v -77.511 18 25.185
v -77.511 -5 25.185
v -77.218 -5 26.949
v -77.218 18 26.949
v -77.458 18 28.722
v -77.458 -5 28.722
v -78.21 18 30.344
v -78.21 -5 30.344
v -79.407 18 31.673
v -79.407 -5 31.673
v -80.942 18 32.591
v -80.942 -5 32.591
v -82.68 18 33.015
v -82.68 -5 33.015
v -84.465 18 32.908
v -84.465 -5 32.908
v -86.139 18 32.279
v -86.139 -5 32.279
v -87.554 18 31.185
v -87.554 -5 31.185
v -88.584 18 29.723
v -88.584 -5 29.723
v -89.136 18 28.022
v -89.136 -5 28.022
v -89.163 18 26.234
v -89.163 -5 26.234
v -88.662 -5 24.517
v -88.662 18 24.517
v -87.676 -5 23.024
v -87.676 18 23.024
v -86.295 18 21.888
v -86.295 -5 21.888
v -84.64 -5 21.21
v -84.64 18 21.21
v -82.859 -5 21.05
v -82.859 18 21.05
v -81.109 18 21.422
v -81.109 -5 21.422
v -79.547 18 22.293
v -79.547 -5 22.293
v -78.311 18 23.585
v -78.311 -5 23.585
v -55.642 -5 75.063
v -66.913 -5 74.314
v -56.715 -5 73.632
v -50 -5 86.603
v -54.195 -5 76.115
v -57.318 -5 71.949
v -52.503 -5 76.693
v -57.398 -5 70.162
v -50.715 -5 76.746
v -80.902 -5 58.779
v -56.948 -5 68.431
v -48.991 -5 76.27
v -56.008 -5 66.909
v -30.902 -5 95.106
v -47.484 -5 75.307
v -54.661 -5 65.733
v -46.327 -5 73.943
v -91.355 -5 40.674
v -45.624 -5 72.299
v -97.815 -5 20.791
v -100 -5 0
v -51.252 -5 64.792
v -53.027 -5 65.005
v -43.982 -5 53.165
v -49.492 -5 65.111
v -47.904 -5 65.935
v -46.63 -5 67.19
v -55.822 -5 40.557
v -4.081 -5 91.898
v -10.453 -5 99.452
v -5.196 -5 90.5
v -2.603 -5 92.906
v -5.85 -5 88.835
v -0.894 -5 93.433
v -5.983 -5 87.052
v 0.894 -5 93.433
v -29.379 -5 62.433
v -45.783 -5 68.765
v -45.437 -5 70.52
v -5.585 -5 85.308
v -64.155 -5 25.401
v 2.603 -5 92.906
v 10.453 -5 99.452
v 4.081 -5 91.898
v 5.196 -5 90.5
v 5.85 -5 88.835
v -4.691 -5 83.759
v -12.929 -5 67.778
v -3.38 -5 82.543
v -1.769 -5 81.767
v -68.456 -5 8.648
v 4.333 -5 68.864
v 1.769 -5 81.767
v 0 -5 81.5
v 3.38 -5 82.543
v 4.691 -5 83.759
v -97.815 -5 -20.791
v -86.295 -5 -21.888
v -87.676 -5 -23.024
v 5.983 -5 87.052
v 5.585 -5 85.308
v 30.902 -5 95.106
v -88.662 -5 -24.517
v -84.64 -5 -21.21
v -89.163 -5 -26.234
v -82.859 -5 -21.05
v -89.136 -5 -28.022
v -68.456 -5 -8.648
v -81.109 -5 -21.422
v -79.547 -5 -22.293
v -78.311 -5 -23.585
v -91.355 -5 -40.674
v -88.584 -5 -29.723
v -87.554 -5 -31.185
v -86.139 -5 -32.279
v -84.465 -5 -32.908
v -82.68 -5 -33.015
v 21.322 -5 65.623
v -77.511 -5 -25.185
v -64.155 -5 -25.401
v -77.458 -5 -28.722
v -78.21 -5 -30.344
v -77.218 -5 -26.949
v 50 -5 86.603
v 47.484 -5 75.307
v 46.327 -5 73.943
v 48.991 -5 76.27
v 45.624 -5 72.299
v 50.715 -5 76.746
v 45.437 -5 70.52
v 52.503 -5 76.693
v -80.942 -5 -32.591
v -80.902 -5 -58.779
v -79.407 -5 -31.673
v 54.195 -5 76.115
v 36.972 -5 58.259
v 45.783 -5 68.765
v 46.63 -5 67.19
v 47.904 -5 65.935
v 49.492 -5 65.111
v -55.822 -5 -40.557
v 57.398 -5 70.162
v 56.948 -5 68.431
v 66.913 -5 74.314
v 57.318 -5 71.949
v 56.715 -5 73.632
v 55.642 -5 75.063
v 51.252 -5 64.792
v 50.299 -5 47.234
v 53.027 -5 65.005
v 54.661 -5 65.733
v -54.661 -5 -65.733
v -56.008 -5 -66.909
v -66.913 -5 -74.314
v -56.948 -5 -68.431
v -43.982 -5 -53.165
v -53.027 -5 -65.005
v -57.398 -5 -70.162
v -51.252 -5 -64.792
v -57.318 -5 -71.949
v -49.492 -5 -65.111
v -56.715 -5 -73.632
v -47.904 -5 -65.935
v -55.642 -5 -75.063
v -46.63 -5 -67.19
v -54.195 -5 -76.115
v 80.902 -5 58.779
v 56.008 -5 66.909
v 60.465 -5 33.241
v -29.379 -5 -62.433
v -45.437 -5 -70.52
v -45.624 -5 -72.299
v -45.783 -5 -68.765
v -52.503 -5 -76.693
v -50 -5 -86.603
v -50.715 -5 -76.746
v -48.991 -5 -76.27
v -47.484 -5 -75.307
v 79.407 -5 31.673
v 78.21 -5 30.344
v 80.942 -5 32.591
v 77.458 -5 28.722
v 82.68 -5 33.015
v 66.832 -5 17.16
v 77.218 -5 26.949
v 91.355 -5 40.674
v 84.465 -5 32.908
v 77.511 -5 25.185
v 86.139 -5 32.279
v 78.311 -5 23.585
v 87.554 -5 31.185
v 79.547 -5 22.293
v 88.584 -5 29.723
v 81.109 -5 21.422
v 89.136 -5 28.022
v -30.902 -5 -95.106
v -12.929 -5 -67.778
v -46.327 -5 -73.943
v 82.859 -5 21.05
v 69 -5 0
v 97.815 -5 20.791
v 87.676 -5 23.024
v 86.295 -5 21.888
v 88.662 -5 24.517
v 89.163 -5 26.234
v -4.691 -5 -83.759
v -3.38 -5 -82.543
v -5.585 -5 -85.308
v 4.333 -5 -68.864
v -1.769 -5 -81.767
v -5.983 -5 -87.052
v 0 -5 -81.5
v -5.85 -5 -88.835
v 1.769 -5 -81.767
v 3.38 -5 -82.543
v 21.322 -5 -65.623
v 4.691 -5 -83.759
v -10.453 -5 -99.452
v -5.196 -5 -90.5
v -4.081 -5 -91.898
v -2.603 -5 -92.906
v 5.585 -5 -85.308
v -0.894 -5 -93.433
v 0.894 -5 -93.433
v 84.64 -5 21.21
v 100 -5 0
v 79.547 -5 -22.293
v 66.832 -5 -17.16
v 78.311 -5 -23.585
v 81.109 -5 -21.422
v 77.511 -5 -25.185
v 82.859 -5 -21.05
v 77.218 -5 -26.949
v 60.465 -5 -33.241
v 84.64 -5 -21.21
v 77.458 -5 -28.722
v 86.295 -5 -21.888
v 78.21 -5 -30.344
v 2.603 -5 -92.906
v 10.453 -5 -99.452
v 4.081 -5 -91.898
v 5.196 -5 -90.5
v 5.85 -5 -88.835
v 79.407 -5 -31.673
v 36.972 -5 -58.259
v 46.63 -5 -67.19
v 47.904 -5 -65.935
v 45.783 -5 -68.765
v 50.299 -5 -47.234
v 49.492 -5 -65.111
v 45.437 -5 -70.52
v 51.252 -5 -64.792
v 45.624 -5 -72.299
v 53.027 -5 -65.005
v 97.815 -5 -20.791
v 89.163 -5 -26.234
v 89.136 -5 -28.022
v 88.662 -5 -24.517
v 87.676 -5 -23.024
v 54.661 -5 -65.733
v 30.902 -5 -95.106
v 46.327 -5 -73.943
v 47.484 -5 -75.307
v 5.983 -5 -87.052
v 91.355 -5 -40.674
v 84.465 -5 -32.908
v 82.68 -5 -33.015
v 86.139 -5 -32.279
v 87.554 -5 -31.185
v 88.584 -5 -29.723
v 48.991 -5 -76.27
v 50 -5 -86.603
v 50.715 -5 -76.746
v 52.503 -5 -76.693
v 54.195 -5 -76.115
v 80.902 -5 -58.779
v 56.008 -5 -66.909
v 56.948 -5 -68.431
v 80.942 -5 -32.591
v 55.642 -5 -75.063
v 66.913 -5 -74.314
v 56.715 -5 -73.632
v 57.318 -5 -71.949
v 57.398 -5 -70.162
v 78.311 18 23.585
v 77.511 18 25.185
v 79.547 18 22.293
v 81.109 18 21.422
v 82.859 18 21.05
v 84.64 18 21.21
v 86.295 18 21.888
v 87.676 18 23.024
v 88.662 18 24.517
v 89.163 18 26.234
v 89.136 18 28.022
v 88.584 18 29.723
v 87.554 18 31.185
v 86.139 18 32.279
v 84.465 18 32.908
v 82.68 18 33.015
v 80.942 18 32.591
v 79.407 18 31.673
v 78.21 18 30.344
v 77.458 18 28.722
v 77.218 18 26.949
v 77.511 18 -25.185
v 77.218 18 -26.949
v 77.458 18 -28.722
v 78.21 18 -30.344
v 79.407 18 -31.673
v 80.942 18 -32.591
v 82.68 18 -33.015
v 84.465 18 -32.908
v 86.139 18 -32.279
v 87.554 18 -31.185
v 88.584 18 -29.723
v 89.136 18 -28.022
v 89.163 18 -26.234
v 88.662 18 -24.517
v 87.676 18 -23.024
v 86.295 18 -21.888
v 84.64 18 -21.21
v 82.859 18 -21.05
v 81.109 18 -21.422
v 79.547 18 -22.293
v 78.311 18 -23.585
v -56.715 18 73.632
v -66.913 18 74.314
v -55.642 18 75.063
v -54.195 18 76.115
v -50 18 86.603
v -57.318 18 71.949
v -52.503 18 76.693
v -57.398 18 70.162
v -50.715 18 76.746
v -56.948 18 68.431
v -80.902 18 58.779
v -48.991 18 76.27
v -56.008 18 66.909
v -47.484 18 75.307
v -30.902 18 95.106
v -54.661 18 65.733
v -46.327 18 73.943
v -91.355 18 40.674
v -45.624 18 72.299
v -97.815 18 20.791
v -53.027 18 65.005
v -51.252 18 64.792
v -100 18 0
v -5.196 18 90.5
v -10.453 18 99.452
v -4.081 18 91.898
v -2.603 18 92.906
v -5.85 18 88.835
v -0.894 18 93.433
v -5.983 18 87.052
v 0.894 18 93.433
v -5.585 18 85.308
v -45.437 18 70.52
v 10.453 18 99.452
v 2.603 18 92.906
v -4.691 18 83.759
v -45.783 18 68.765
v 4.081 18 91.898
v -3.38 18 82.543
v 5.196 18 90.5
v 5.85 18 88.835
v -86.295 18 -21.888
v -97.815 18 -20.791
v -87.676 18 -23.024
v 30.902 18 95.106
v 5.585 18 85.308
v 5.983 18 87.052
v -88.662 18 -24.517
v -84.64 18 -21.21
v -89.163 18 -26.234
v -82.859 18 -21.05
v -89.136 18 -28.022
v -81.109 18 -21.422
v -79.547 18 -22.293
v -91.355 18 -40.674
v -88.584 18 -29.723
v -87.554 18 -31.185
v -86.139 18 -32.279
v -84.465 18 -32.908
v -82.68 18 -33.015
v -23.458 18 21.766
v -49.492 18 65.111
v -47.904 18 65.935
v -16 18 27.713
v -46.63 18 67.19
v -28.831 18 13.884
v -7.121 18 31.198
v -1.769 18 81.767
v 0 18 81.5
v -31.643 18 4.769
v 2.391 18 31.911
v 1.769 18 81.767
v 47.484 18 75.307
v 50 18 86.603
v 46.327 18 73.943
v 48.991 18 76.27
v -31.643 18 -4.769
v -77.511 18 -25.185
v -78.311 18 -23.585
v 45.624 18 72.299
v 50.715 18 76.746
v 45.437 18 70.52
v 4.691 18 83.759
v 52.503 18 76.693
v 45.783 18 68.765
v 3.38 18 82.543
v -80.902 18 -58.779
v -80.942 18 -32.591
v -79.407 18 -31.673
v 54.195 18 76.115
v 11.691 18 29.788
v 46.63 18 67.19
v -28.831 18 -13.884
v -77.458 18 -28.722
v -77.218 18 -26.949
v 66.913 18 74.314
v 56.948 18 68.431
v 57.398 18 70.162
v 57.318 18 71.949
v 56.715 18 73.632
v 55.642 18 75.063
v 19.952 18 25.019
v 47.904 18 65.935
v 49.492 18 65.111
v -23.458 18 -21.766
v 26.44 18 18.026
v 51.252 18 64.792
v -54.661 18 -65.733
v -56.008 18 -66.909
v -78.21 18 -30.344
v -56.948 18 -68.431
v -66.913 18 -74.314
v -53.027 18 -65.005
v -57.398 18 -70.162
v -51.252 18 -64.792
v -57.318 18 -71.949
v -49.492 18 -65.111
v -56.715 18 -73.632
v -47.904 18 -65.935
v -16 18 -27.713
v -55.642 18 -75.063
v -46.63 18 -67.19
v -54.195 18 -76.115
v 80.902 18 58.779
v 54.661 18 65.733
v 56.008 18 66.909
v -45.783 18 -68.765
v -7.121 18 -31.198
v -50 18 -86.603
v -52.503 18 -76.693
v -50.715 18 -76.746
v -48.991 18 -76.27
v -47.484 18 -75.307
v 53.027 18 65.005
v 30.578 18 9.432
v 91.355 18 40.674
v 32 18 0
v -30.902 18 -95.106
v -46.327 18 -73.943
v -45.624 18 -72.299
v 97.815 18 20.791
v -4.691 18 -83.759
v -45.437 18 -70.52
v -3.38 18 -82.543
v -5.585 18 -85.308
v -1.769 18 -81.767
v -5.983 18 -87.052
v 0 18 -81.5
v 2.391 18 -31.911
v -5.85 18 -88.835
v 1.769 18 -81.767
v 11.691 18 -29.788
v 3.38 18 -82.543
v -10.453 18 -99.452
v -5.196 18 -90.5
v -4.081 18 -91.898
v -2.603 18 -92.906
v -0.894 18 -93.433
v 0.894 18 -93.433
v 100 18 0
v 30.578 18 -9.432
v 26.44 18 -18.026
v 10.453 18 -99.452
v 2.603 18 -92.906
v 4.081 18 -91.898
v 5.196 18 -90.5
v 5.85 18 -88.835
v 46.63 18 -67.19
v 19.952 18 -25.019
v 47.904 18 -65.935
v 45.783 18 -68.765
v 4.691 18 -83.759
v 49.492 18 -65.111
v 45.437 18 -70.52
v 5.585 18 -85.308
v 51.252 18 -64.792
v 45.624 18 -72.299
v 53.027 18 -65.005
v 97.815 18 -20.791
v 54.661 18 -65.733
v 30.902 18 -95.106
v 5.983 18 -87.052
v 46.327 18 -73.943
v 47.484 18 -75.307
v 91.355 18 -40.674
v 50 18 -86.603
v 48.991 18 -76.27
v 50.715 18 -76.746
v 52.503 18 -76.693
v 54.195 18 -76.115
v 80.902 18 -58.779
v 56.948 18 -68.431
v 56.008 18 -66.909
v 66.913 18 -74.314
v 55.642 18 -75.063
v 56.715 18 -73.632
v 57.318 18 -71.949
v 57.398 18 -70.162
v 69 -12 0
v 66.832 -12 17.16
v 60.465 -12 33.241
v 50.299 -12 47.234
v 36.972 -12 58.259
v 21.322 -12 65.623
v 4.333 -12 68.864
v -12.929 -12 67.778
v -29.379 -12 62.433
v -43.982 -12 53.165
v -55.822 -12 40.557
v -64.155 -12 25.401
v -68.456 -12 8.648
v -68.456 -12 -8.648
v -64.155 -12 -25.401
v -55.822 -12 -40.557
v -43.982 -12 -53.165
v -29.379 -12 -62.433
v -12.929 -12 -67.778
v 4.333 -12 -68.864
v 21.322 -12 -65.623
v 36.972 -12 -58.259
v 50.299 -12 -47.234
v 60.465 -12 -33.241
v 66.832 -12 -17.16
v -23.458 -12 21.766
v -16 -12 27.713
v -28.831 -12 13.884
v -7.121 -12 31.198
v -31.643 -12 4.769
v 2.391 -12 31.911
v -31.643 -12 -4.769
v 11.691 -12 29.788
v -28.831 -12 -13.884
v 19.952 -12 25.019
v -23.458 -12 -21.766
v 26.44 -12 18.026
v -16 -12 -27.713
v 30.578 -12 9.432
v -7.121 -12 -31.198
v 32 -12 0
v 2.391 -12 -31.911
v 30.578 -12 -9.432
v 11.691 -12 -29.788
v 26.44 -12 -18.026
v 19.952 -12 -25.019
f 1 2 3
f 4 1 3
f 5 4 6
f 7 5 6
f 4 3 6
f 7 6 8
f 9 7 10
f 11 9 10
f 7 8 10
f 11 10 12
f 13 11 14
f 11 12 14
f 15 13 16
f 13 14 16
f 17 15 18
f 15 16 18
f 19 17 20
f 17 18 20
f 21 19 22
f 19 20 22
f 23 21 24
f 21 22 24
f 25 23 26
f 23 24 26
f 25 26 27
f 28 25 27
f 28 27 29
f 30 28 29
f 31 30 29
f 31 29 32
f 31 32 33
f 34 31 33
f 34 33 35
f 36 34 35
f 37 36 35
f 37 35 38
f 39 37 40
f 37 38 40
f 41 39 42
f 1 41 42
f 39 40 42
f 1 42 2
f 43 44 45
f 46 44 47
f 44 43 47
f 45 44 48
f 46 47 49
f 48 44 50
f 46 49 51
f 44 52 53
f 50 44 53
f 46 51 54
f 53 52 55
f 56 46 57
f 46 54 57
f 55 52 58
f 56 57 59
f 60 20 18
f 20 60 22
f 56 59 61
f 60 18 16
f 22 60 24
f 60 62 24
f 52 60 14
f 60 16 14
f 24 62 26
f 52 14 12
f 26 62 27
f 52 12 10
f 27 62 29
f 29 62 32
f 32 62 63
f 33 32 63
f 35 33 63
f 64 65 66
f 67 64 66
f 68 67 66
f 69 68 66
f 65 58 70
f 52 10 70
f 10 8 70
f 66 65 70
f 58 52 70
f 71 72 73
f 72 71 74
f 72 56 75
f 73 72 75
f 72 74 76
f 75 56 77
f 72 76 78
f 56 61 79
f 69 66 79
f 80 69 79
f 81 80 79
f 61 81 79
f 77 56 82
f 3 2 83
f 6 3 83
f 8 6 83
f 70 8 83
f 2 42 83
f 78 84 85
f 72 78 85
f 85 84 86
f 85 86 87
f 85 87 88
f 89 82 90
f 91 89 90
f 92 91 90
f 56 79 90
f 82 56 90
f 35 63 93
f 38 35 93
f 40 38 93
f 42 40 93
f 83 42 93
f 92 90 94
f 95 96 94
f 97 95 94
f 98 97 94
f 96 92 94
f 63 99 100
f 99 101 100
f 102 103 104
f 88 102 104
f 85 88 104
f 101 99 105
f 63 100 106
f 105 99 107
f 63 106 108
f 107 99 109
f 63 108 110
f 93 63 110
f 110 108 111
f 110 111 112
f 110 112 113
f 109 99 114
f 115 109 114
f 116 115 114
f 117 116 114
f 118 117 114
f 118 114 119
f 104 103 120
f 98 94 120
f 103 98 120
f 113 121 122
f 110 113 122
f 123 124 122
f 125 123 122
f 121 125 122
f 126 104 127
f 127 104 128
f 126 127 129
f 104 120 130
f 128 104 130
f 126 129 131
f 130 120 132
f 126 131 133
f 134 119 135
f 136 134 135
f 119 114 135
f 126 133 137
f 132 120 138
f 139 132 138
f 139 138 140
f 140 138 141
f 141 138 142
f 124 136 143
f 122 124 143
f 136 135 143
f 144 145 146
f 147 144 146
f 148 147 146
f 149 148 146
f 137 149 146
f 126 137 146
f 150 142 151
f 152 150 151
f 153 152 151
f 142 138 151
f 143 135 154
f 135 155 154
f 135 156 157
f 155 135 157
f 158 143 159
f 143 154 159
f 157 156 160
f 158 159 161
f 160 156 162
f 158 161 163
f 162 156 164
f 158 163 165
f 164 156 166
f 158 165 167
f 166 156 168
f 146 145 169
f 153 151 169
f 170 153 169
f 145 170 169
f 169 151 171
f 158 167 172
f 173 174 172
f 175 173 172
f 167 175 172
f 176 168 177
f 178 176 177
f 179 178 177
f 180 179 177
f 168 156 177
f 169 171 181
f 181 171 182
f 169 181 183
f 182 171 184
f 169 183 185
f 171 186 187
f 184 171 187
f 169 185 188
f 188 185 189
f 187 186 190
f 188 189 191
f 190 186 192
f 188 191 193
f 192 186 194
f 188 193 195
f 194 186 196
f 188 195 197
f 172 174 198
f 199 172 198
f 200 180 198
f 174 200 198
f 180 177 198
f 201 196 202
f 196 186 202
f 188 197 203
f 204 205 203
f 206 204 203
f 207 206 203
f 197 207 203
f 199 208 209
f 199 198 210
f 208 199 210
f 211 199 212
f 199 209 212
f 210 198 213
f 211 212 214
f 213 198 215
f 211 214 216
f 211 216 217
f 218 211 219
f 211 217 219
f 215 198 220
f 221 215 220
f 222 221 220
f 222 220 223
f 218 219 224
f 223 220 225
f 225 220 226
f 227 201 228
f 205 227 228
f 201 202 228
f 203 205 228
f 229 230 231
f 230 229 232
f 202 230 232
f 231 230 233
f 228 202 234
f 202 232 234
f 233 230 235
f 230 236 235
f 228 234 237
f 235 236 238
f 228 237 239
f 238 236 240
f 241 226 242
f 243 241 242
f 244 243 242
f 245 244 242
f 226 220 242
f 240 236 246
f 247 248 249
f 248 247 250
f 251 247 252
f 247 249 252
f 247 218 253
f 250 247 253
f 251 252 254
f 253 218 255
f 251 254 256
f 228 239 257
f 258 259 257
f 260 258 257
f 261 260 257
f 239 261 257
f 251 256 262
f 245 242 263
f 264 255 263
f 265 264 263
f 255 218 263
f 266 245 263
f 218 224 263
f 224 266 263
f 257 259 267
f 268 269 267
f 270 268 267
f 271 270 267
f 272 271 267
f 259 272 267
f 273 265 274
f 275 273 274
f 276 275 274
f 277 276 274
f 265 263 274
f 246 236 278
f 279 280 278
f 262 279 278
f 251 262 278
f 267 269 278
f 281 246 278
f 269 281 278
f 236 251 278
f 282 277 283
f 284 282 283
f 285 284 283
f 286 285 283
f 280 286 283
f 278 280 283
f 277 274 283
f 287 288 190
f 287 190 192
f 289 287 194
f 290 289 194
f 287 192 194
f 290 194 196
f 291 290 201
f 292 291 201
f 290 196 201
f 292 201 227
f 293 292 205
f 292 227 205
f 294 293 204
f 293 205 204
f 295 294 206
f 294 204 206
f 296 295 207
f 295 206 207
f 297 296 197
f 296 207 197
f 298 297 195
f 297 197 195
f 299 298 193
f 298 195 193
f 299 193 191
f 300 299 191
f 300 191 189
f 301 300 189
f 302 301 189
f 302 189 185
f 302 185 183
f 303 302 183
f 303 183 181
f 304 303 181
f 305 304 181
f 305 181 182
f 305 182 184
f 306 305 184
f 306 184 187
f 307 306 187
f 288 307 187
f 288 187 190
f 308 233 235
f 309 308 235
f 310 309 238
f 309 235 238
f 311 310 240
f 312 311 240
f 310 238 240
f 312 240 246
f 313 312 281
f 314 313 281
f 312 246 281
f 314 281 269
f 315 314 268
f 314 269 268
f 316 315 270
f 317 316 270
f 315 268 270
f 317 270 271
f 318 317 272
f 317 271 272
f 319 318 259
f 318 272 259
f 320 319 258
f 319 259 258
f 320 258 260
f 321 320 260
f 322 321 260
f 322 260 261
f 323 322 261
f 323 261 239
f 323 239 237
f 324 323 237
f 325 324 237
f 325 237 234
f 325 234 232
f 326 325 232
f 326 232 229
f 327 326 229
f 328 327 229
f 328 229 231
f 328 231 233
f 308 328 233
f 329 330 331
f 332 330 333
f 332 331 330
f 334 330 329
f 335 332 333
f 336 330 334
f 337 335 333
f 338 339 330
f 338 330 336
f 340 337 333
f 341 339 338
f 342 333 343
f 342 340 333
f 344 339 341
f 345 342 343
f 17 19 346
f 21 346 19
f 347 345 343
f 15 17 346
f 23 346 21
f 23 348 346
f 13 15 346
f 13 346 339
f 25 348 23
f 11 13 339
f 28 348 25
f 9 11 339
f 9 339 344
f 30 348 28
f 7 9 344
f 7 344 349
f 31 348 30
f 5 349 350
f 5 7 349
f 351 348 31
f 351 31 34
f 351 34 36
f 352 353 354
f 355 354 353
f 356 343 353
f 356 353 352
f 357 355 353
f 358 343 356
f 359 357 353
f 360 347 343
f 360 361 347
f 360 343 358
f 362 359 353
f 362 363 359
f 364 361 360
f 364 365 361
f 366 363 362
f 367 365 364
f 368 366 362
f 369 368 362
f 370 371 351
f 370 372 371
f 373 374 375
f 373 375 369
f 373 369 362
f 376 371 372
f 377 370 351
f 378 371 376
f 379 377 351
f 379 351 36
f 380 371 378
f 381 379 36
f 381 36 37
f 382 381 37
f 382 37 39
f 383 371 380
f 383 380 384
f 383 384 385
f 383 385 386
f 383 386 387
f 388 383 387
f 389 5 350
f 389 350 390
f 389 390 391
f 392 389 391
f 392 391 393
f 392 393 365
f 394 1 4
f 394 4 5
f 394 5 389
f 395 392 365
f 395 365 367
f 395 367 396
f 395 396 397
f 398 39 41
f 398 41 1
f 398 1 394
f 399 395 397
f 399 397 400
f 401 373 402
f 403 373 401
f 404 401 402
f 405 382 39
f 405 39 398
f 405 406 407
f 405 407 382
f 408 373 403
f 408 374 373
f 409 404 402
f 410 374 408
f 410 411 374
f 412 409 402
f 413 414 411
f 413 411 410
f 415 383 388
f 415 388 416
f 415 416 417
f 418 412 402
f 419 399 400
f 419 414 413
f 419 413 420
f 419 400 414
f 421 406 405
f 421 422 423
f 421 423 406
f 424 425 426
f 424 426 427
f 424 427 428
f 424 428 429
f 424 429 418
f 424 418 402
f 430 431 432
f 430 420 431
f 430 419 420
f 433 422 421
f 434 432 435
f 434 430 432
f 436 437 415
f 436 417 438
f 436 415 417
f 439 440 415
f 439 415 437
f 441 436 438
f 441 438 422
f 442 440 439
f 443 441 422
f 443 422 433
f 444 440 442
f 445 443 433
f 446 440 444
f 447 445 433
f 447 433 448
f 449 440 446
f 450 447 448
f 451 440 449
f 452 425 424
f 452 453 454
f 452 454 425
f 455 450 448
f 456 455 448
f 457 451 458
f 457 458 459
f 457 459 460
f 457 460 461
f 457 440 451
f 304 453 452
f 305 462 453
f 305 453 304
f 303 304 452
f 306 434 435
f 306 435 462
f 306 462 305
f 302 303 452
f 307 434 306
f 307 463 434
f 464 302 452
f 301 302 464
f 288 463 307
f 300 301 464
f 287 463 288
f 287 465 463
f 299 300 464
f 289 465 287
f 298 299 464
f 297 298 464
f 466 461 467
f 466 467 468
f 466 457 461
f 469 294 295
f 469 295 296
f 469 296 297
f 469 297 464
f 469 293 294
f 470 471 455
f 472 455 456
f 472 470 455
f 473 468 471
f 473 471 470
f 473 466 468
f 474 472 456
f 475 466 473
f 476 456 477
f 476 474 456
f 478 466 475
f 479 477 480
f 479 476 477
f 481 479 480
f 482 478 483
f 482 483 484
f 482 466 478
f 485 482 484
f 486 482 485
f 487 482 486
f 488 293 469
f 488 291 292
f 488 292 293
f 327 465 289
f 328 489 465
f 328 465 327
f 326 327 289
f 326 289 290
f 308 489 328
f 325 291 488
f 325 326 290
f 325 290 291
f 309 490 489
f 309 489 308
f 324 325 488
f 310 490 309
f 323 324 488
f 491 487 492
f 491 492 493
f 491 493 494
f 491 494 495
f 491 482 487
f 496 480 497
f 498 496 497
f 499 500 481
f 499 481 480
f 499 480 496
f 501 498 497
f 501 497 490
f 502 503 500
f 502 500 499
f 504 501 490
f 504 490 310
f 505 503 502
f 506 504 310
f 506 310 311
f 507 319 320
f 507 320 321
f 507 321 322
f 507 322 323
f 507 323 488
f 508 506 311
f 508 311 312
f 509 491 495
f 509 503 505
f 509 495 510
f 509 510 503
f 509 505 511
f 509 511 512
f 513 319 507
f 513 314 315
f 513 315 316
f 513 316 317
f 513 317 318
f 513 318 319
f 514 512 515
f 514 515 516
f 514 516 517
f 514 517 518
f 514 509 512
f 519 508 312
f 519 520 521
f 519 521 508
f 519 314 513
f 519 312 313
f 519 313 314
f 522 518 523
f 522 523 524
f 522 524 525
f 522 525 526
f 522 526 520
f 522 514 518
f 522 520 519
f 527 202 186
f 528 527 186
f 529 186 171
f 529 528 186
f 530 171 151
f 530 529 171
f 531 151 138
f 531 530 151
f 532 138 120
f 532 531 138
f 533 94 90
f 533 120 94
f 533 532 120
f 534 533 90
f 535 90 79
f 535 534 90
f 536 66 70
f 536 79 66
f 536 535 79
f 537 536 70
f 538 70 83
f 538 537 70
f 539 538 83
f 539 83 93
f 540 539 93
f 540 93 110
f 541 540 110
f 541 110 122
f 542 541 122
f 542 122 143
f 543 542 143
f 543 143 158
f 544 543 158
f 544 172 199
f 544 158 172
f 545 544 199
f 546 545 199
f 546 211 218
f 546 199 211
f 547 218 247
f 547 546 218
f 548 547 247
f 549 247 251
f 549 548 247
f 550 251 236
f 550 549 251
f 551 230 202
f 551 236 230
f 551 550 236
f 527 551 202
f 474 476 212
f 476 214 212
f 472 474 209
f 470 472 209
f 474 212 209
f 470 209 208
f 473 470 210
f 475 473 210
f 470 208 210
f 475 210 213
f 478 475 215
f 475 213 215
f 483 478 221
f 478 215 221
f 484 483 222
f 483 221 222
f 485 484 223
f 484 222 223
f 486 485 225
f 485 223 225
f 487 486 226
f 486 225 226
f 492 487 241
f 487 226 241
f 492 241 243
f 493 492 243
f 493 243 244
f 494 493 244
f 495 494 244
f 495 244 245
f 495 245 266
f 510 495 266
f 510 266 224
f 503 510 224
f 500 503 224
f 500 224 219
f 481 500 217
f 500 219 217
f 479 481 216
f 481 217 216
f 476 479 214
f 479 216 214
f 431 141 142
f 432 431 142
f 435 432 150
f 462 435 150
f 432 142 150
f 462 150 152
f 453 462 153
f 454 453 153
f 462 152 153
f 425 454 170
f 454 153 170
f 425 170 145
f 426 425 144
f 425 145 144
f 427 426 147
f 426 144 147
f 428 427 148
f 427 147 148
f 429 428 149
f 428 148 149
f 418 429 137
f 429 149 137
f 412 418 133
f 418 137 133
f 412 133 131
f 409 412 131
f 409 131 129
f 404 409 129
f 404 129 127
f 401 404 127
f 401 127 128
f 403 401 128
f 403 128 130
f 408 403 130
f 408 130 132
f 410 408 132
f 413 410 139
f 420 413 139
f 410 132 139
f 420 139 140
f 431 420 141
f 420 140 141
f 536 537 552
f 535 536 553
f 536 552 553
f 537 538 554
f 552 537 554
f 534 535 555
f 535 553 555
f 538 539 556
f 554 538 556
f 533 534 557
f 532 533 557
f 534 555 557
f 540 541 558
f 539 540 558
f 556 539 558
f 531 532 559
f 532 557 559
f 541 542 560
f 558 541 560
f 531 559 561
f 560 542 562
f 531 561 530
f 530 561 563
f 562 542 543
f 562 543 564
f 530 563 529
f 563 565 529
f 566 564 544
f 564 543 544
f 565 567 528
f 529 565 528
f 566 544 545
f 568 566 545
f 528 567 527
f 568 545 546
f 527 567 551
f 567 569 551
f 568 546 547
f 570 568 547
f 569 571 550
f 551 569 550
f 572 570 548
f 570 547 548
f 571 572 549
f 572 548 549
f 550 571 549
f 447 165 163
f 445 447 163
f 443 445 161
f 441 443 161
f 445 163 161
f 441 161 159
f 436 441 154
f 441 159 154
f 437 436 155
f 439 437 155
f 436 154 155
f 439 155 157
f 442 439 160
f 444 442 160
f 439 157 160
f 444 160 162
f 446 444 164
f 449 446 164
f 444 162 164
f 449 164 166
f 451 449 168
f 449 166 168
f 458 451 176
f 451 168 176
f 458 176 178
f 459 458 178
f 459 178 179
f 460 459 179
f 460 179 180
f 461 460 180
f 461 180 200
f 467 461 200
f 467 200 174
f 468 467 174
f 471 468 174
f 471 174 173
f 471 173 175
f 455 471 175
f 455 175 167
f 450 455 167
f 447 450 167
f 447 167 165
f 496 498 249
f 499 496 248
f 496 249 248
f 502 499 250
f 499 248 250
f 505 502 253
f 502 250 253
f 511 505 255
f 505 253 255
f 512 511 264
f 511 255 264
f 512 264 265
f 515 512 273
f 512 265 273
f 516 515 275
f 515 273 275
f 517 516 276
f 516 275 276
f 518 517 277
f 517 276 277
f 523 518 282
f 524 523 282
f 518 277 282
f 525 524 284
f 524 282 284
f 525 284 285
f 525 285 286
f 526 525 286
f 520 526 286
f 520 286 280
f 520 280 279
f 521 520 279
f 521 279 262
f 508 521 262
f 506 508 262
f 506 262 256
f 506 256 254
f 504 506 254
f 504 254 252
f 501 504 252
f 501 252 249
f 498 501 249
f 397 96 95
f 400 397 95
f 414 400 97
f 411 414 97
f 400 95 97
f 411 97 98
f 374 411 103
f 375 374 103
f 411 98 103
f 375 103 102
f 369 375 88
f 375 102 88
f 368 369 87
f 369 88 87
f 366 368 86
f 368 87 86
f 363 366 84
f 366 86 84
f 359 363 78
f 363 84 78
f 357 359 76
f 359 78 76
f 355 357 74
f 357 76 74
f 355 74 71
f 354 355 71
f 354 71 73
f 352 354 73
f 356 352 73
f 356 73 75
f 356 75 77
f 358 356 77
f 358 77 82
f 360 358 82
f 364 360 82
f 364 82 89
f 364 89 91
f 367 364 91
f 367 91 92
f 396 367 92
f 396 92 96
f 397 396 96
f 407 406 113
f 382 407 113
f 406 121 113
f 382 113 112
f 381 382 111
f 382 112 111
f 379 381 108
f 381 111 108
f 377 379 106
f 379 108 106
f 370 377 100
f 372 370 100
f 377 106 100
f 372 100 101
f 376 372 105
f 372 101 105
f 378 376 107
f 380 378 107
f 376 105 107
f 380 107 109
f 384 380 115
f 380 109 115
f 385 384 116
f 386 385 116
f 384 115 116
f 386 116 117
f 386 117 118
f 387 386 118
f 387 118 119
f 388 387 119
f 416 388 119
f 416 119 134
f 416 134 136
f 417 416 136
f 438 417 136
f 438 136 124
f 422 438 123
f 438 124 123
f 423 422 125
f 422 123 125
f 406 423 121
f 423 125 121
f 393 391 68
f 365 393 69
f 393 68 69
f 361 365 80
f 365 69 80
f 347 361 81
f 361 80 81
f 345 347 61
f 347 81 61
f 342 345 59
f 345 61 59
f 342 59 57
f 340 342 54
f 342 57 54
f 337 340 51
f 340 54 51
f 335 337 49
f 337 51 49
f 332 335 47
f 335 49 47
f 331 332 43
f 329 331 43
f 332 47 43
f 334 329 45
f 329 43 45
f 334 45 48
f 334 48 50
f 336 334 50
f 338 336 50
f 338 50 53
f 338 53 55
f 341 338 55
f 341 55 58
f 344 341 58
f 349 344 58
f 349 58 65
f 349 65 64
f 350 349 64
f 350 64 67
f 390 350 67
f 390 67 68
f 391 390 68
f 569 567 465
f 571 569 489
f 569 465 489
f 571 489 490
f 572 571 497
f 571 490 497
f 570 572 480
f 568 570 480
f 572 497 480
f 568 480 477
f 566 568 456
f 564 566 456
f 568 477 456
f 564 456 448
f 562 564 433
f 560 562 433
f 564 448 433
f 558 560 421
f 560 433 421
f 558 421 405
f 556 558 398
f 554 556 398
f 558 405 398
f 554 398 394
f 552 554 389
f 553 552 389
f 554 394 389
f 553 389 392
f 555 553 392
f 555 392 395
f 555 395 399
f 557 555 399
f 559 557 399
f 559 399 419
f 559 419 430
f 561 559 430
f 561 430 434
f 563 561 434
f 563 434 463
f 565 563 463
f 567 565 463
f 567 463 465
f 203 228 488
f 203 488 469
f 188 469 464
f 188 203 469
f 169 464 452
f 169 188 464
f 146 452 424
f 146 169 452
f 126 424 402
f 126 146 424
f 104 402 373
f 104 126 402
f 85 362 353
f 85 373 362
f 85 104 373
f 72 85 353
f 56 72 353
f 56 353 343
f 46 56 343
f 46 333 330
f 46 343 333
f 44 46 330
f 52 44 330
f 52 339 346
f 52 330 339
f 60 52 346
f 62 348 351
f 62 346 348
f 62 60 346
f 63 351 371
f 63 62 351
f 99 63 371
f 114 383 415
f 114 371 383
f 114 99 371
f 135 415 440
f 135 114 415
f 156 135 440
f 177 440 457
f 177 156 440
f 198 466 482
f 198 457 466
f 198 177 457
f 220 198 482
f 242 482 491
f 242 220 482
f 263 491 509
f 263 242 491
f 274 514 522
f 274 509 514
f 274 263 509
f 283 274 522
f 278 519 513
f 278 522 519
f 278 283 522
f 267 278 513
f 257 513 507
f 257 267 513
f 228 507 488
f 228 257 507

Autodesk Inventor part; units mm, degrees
ref_plane "YZ Plane" through (0, 0, 0) normal (1, 0, 0) x (0, 1, 0)
ref_plane "XZ Plane" through (0, 0, 0) normal (0, 1, 0) x (-1, 0, 0)
ref_plane "XY Plane" through (0, 0, 0) normal (0, 0, 1) x (1, 0, 0)
sketch "Эскиз1" plane through (0, 0, 0) normal (0, 0, 1) x (1, 0, 0)
  line L0 (0, 0) -> (0, 18)
  line L1 (0, 18) -> (100, 18)
  line L2 (100, 18) -> (100, -5)
  line L3 (100, -5) -> (69, -5)
  line L4 (69, -5) -> (69, -12)
  line L5 (69, -12) -> (49, -12)
  line L6 (49, -12) -> (49, 1)
  line L7 (49, 1) -> (32, 1)
  line L8 (32, 1) -> (32, 18)
  line L9 (32, 1) -> (32, -12)
  line L10 (32, -12) -> (49, -12)
  dimension "d7" = 18
  dimension "d8" = 100
  dimension "d9" = 23
  dimension "d10" = 31
  dimension "d11" = 20
  dimension "d12" = 13
  dimension "d13" = 17
  dimension "d26" = 17
revolve "Вращение1" add sketch "Эскиз1" angle 360 about axis through (0, 0, 0) along (0, 1, 0)
sketch "Эскиз2" plane through (0, 18, 0) normal (0, 1, 0) x (1, 0, 0)
  circle A0 centre (0, 0) radius 100 projected
  circle A1 centre (0, 0) radius 100 projected
  line L0 (0, 100) -> (0, 87.5)
  dimension "d15" = 12.5
hole "Отверстие1" at (0, 18, -87.5) direction (0, -1, 0) diameter 12 end through all
pattern_circular "Круговой массив2" count 10 over 360 about axis through (0, 6.5, 0) along (0, -1, 0) of "Отверстие1"
properties part number "Крышка сальников_CPY" material "Чугун, серый"
